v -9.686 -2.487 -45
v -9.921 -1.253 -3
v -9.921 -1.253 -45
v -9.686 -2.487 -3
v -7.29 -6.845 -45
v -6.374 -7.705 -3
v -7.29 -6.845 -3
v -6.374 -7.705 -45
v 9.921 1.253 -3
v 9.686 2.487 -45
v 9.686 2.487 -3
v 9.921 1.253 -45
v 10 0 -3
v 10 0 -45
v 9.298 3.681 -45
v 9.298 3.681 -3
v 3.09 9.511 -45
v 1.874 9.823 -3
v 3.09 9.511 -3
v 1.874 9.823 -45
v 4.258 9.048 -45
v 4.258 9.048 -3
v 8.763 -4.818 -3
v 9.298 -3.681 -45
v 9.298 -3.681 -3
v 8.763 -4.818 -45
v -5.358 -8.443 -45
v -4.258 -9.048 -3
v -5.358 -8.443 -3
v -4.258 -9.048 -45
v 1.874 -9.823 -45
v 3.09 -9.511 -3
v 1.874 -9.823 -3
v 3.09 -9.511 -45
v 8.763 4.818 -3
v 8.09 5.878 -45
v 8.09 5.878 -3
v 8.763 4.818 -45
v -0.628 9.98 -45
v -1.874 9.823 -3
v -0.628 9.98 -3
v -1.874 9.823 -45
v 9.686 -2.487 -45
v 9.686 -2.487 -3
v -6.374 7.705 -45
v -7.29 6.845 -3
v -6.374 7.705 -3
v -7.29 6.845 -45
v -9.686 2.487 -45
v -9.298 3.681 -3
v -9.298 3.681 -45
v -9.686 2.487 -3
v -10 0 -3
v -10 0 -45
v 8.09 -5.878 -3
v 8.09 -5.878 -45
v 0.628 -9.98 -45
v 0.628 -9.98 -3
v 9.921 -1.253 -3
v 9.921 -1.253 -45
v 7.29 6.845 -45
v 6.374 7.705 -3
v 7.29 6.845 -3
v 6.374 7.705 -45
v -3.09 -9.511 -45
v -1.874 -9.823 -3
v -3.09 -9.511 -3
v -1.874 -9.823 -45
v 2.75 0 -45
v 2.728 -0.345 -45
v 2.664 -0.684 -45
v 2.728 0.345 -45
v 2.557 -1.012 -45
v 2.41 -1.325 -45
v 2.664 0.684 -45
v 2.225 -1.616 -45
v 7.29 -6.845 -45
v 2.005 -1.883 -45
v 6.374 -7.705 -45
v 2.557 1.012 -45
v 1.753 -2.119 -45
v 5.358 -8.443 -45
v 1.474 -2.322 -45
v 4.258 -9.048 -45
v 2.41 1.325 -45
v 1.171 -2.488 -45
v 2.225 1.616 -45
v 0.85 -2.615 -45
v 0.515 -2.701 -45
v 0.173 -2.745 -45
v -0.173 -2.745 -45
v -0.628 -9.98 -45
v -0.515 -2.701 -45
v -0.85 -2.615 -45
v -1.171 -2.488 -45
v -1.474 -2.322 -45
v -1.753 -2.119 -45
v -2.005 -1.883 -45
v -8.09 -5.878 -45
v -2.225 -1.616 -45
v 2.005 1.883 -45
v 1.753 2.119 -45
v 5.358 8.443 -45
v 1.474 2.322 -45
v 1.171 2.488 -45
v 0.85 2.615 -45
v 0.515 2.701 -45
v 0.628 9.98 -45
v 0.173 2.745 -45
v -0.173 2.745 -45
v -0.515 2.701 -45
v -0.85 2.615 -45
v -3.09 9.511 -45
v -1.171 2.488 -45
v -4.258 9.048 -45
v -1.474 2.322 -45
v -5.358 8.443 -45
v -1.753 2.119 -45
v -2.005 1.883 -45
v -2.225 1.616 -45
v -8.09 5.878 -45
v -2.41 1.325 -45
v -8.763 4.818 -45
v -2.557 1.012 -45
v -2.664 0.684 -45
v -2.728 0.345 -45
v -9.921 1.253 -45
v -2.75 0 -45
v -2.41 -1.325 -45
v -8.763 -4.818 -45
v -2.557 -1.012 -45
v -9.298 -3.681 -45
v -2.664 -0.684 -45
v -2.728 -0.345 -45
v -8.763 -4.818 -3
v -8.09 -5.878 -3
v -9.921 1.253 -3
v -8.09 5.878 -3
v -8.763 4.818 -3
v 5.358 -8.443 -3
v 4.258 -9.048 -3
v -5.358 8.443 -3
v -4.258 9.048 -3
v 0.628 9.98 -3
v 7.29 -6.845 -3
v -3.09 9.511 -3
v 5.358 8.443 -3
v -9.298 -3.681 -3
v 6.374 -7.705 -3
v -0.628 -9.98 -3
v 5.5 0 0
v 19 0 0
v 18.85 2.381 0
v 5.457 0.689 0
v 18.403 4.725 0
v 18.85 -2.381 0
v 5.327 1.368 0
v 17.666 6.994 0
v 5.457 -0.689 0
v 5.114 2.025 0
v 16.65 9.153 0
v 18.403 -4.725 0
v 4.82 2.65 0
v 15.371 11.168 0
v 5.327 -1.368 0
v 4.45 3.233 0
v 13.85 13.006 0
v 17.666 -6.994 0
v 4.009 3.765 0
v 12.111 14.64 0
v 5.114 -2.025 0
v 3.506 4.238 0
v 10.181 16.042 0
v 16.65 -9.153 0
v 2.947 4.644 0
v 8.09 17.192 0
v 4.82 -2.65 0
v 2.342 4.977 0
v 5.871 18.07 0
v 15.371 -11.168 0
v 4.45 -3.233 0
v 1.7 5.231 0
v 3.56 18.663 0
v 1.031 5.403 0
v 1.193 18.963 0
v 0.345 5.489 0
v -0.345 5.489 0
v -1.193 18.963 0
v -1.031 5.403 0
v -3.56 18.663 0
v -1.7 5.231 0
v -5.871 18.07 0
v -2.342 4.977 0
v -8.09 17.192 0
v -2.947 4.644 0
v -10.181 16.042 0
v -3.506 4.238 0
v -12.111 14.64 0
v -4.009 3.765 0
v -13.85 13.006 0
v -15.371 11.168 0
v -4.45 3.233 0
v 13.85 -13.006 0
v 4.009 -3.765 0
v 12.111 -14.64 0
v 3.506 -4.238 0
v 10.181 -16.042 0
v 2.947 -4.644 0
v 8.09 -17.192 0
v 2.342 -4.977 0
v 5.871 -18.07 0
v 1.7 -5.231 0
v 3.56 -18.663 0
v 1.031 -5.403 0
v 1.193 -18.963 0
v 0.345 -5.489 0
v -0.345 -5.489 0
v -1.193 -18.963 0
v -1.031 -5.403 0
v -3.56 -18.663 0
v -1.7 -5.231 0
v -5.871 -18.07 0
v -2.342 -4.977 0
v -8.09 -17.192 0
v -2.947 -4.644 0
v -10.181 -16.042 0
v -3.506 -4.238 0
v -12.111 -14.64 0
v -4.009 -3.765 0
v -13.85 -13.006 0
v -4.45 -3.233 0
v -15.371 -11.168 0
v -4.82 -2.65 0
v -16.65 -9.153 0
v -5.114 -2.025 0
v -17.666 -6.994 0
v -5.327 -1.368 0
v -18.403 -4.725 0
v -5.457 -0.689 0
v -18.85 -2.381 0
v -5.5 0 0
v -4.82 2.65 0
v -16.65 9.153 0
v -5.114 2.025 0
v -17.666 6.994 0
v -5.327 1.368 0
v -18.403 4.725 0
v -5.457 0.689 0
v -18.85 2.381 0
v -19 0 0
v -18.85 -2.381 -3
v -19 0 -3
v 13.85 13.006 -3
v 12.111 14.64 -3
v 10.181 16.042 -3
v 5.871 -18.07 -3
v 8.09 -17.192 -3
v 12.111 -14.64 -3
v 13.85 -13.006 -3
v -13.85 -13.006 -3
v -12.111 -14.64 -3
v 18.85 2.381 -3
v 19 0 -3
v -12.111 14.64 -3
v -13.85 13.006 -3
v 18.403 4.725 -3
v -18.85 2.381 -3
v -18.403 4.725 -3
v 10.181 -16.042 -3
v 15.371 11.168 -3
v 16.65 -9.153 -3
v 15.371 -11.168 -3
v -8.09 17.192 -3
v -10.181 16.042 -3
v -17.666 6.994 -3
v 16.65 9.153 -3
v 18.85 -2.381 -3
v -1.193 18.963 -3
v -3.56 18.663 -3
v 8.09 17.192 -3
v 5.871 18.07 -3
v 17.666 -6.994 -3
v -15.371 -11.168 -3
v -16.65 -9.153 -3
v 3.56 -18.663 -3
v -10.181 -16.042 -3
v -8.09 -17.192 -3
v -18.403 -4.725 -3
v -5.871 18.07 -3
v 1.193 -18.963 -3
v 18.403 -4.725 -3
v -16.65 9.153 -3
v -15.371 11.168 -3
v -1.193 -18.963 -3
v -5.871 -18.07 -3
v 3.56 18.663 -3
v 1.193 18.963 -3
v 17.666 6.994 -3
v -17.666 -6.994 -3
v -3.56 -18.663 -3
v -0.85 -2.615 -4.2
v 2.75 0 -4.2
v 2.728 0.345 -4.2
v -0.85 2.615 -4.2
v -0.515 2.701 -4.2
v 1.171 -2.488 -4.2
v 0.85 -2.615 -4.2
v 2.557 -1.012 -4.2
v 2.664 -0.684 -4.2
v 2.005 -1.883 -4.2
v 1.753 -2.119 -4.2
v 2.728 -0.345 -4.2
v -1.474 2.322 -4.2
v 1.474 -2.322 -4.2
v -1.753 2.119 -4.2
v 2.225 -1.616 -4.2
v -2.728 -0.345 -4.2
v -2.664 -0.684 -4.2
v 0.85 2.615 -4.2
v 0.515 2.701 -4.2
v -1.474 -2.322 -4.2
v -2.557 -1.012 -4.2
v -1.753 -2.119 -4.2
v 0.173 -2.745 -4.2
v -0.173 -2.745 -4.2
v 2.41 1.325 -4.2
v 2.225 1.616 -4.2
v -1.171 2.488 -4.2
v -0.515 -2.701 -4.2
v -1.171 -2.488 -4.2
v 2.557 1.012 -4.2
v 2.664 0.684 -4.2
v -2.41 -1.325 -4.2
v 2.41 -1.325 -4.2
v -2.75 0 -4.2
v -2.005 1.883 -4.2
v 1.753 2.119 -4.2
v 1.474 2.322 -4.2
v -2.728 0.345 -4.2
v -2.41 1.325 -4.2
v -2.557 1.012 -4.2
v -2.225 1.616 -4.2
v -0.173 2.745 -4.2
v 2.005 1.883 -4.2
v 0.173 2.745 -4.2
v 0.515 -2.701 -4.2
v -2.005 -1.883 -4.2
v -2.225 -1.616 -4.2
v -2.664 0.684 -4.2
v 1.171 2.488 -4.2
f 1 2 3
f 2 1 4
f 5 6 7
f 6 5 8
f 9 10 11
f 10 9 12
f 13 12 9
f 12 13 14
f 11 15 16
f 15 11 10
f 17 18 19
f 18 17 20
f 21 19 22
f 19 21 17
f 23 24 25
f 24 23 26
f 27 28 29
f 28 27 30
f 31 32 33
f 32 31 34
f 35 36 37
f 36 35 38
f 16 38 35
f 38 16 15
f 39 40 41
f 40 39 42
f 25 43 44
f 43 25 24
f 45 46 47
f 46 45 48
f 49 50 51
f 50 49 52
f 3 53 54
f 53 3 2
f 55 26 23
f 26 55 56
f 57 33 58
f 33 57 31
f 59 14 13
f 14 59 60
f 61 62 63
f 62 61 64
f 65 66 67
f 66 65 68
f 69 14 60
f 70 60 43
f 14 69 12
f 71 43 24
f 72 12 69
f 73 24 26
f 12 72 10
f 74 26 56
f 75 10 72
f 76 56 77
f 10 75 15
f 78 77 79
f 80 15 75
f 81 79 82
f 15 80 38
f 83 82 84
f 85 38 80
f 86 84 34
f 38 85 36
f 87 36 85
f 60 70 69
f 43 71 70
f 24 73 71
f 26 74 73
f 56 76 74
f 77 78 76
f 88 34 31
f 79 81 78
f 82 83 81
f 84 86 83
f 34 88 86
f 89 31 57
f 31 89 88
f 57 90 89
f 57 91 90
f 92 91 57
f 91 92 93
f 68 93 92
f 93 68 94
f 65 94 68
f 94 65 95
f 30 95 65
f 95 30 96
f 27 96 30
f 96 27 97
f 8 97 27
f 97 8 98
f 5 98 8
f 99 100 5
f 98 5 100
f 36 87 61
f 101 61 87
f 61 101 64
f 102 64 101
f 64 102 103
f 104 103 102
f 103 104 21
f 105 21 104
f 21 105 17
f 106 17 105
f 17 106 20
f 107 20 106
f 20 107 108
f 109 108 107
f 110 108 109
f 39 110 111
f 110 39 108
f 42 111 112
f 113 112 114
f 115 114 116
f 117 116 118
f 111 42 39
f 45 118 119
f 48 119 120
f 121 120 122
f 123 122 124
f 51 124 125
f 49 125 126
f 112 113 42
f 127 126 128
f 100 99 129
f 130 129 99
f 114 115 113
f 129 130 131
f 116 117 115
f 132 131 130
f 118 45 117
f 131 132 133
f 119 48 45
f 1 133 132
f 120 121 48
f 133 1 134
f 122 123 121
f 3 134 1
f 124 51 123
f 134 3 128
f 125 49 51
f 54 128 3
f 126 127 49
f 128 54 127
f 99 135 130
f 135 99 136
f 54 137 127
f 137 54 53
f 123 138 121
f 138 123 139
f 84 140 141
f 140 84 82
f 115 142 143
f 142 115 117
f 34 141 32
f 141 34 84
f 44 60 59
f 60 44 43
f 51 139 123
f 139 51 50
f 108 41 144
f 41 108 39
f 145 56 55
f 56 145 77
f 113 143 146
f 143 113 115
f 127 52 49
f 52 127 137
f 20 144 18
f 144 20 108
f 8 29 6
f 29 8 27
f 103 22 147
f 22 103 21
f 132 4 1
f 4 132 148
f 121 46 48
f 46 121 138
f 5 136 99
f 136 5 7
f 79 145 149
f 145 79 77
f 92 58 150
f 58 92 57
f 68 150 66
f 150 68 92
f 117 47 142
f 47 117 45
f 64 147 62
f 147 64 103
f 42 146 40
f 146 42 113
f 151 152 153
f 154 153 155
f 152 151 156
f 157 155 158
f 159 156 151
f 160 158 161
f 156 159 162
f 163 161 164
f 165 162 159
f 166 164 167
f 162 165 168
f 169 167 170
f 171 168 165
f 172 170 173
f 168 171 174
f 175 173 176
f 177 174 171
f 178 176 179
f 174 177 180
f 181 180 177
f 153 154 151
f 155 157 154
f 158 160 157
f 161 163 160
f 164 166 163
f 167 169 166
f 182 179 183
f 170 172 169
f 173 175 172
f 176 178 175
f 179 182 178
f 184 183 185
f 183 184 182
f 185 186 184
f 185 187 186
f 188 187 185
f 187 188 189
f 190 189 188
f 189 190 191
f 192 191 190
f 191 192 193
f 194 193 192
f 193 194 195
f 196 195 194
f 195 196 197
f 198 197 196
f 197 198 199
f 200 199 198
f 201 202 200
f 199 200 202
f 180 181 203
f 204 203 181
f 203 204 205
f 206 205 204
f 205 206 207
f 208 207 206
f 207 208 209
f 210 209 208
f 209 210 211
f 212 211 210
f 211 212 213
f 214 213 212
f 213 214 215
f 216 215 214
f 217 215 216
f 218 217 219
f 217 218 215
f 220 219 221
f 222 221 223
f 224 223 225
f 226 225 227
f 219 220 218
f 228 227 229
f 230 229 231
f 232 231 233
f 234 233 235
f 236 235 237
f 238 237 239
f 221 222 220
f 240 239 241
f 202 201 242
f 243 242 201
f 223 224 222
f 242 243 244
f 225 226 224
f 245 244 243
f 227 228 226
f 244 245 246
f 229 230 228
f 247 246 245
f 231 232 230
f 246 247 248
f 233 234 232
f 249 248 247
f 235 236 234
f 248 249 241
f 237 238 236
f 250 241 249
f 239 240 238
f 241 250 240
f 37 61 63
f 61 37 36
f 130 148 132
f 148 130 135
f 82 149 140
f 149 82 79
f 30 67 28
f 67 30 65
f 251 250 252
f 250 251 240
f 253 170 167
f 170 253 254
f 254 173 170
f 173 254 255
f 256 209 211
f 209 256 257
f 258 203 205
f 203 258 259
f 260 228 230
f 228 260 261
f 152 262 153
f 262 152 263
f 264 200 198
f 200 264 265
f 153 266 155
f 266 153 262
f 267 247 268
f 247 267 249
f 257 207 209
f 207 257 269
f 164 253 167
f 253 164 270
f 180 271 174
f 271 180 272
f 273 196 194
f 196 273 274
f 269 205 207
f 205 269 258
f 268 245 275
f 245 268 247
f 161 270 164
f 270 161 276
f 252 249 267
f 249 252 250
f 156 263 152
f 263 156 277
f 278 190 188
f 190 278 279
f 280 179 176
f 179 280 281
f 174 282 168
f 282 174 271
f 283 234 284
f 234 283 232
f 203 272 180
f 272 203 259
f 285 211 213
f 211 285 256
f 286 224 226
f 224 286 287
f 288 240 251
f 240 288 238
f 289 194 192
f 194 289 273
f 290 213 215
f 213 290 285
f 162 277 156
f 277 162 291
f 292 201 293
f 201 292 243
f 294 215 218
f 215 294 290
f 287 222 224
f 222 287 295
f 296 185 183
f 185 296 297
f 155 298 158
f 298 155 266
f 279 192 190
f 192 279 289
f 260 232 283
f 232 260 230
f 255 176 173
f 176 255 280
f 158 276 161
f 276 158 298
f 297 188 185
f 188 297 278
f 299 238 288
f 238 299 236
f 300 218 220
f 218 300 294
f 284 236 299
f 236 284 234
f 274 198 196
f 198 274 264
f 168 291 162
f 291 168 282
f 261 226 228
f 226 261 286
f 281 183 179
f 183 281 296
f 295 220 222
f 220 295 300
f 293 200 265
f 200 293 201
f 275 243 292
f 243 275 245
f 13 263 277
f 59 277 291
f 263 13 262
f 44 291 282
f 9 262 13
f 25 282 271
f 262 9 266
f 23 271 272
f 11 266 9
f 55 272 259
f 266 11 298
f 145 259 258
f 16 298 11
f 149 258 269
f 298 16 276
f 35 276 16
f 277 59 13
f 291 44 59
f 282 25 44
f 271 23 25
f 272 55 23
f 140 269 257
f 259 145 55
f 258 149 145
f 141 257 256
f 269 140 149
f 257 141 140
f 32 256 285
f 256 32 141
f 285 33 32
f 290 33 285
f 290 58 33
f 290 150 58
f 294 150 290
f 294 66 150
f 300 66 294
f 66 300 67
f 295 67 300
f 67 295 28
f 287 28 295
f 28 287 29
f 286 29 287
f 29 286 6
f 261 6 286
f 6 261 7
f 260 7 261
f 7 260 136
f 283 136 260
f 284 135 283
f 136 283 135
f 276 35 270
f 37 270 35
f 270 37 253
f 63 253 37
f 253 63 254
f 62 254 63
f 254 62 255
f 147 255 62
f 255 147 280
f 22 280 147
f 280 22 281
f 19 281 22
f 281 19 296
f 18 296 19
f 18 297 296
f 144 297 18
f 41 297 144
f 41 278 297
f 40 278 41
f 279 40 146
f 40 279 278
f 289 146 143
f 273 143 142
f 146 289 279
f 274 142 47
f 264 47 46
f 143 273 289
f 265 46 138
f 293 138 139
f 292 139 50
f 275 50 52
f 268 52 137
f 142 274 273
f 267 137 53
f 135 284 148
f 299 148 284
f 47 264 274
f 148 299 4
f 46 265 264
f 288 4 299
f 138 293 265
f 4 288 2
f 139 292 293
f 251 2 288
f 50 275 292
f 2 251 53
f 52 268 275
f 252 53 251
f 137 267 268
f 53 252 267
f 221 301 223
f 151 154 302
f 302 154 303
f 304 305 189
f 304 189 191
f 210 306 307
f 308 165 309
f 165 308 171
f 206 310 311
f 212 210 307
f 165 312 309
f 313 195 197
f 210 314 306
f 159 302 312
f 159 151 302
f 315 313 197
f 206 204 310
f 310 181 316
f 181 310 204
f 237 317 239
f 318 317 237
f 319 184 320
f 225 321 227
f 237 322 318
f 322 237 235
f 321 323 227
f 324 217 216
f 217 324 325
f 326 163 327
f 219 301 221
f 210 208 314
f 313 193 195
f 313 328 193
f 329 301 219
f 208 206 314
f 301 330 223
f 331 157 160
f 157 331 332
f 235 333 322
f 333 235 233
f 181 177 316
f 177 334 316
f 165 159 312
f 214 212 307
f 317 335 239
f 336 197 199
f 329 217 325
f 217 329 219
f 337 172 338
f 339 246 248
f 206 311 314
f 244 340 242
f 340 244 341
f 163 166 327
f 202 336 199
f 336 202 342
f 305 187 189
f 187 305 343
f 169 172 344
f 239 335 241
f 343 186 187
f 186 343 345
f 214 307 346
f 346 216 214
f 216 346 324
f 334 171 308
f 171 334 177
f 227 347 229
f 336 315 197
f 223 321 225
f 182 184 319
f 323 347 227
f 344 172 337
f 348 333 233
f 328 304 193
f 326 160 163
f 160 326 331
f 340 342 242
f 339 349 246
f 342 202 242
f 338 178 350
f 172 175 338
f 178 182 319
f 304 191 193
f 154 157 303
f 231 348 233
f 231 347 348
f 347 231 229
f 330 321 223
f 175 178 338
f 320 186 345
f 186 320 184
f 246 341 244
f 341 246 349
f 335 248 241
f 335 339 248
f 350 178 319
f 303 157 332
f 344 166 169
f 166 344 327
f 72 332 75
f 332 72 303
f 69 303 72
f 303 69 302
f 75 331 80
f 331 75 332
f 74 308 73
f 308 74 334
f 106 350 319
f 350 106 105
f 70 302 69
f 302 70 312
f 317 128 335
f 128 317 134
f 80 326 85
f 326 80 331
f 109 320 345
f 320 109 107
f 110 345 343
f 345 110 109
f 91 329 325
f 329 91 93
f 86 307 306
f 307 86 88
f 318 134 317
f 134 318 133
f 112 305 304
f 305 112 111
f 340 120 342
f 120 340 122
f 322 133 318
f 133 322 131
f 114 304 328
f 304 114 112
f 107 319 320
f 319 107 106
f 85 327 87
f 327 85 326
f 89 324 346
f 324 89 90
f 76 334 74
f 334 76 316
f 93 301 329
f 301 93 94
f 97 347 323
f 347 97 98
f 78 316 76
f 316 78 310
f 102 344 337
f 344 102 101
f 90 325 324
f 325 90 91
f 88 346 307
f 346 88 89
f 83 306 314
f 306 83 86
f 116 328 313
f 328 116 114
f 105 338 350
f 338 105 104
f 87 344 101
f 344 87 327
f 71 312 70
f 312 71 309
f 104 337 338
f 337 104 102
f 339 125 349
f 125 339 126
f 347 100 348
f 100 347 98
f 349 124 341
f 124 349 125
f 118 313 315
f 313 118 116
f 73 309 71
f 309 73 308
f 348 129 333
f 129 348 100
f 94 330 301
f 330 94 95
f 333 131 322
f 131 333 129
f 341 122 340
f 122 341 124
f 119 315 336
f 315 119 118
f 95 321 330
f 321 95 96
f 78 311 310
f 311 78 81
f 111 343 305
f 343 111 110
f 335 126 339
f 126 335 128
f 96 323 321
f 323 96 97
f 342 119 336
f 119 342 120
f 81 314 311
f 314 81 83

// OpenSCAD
$fn = 50;


difference() {
	union() {
		translate(v = [0, 0, -45.0000000000]) {
			cylinder(h = 45, r = 10.0000000000);
		}
		translate(v = [0, 0, -3.0000000000]) {
			cylinder(h = 3, r = 19.0000000000);
		}
	}
	union() {
		translate(v = [0, 0, 0]) {
			rotate(a = [0, 0, 0]) {
				difference() {
					union() {
						#translate(v = [0, 0, -45.0000000000]) {
							cylinder(h = 45, r = 2.2500000000);
						}
						#translate(v = [0, 0, -4.2000000000]) {
							cylinder(h = 4.2000000000, r1 = 2.7500000000, r2 = 5.5000000000);
						}
						#translate(v = [0, 0, -45.0000000000]) {
							cylinder(h = 45, r = 2.7500000000);
						}
						#translate(v = [0, 0, -45.0000000000]) {
							cylinder(h = 45, r = 2.2500000000);
						}
					}
					union();
				}
			}
		}
	}
}
